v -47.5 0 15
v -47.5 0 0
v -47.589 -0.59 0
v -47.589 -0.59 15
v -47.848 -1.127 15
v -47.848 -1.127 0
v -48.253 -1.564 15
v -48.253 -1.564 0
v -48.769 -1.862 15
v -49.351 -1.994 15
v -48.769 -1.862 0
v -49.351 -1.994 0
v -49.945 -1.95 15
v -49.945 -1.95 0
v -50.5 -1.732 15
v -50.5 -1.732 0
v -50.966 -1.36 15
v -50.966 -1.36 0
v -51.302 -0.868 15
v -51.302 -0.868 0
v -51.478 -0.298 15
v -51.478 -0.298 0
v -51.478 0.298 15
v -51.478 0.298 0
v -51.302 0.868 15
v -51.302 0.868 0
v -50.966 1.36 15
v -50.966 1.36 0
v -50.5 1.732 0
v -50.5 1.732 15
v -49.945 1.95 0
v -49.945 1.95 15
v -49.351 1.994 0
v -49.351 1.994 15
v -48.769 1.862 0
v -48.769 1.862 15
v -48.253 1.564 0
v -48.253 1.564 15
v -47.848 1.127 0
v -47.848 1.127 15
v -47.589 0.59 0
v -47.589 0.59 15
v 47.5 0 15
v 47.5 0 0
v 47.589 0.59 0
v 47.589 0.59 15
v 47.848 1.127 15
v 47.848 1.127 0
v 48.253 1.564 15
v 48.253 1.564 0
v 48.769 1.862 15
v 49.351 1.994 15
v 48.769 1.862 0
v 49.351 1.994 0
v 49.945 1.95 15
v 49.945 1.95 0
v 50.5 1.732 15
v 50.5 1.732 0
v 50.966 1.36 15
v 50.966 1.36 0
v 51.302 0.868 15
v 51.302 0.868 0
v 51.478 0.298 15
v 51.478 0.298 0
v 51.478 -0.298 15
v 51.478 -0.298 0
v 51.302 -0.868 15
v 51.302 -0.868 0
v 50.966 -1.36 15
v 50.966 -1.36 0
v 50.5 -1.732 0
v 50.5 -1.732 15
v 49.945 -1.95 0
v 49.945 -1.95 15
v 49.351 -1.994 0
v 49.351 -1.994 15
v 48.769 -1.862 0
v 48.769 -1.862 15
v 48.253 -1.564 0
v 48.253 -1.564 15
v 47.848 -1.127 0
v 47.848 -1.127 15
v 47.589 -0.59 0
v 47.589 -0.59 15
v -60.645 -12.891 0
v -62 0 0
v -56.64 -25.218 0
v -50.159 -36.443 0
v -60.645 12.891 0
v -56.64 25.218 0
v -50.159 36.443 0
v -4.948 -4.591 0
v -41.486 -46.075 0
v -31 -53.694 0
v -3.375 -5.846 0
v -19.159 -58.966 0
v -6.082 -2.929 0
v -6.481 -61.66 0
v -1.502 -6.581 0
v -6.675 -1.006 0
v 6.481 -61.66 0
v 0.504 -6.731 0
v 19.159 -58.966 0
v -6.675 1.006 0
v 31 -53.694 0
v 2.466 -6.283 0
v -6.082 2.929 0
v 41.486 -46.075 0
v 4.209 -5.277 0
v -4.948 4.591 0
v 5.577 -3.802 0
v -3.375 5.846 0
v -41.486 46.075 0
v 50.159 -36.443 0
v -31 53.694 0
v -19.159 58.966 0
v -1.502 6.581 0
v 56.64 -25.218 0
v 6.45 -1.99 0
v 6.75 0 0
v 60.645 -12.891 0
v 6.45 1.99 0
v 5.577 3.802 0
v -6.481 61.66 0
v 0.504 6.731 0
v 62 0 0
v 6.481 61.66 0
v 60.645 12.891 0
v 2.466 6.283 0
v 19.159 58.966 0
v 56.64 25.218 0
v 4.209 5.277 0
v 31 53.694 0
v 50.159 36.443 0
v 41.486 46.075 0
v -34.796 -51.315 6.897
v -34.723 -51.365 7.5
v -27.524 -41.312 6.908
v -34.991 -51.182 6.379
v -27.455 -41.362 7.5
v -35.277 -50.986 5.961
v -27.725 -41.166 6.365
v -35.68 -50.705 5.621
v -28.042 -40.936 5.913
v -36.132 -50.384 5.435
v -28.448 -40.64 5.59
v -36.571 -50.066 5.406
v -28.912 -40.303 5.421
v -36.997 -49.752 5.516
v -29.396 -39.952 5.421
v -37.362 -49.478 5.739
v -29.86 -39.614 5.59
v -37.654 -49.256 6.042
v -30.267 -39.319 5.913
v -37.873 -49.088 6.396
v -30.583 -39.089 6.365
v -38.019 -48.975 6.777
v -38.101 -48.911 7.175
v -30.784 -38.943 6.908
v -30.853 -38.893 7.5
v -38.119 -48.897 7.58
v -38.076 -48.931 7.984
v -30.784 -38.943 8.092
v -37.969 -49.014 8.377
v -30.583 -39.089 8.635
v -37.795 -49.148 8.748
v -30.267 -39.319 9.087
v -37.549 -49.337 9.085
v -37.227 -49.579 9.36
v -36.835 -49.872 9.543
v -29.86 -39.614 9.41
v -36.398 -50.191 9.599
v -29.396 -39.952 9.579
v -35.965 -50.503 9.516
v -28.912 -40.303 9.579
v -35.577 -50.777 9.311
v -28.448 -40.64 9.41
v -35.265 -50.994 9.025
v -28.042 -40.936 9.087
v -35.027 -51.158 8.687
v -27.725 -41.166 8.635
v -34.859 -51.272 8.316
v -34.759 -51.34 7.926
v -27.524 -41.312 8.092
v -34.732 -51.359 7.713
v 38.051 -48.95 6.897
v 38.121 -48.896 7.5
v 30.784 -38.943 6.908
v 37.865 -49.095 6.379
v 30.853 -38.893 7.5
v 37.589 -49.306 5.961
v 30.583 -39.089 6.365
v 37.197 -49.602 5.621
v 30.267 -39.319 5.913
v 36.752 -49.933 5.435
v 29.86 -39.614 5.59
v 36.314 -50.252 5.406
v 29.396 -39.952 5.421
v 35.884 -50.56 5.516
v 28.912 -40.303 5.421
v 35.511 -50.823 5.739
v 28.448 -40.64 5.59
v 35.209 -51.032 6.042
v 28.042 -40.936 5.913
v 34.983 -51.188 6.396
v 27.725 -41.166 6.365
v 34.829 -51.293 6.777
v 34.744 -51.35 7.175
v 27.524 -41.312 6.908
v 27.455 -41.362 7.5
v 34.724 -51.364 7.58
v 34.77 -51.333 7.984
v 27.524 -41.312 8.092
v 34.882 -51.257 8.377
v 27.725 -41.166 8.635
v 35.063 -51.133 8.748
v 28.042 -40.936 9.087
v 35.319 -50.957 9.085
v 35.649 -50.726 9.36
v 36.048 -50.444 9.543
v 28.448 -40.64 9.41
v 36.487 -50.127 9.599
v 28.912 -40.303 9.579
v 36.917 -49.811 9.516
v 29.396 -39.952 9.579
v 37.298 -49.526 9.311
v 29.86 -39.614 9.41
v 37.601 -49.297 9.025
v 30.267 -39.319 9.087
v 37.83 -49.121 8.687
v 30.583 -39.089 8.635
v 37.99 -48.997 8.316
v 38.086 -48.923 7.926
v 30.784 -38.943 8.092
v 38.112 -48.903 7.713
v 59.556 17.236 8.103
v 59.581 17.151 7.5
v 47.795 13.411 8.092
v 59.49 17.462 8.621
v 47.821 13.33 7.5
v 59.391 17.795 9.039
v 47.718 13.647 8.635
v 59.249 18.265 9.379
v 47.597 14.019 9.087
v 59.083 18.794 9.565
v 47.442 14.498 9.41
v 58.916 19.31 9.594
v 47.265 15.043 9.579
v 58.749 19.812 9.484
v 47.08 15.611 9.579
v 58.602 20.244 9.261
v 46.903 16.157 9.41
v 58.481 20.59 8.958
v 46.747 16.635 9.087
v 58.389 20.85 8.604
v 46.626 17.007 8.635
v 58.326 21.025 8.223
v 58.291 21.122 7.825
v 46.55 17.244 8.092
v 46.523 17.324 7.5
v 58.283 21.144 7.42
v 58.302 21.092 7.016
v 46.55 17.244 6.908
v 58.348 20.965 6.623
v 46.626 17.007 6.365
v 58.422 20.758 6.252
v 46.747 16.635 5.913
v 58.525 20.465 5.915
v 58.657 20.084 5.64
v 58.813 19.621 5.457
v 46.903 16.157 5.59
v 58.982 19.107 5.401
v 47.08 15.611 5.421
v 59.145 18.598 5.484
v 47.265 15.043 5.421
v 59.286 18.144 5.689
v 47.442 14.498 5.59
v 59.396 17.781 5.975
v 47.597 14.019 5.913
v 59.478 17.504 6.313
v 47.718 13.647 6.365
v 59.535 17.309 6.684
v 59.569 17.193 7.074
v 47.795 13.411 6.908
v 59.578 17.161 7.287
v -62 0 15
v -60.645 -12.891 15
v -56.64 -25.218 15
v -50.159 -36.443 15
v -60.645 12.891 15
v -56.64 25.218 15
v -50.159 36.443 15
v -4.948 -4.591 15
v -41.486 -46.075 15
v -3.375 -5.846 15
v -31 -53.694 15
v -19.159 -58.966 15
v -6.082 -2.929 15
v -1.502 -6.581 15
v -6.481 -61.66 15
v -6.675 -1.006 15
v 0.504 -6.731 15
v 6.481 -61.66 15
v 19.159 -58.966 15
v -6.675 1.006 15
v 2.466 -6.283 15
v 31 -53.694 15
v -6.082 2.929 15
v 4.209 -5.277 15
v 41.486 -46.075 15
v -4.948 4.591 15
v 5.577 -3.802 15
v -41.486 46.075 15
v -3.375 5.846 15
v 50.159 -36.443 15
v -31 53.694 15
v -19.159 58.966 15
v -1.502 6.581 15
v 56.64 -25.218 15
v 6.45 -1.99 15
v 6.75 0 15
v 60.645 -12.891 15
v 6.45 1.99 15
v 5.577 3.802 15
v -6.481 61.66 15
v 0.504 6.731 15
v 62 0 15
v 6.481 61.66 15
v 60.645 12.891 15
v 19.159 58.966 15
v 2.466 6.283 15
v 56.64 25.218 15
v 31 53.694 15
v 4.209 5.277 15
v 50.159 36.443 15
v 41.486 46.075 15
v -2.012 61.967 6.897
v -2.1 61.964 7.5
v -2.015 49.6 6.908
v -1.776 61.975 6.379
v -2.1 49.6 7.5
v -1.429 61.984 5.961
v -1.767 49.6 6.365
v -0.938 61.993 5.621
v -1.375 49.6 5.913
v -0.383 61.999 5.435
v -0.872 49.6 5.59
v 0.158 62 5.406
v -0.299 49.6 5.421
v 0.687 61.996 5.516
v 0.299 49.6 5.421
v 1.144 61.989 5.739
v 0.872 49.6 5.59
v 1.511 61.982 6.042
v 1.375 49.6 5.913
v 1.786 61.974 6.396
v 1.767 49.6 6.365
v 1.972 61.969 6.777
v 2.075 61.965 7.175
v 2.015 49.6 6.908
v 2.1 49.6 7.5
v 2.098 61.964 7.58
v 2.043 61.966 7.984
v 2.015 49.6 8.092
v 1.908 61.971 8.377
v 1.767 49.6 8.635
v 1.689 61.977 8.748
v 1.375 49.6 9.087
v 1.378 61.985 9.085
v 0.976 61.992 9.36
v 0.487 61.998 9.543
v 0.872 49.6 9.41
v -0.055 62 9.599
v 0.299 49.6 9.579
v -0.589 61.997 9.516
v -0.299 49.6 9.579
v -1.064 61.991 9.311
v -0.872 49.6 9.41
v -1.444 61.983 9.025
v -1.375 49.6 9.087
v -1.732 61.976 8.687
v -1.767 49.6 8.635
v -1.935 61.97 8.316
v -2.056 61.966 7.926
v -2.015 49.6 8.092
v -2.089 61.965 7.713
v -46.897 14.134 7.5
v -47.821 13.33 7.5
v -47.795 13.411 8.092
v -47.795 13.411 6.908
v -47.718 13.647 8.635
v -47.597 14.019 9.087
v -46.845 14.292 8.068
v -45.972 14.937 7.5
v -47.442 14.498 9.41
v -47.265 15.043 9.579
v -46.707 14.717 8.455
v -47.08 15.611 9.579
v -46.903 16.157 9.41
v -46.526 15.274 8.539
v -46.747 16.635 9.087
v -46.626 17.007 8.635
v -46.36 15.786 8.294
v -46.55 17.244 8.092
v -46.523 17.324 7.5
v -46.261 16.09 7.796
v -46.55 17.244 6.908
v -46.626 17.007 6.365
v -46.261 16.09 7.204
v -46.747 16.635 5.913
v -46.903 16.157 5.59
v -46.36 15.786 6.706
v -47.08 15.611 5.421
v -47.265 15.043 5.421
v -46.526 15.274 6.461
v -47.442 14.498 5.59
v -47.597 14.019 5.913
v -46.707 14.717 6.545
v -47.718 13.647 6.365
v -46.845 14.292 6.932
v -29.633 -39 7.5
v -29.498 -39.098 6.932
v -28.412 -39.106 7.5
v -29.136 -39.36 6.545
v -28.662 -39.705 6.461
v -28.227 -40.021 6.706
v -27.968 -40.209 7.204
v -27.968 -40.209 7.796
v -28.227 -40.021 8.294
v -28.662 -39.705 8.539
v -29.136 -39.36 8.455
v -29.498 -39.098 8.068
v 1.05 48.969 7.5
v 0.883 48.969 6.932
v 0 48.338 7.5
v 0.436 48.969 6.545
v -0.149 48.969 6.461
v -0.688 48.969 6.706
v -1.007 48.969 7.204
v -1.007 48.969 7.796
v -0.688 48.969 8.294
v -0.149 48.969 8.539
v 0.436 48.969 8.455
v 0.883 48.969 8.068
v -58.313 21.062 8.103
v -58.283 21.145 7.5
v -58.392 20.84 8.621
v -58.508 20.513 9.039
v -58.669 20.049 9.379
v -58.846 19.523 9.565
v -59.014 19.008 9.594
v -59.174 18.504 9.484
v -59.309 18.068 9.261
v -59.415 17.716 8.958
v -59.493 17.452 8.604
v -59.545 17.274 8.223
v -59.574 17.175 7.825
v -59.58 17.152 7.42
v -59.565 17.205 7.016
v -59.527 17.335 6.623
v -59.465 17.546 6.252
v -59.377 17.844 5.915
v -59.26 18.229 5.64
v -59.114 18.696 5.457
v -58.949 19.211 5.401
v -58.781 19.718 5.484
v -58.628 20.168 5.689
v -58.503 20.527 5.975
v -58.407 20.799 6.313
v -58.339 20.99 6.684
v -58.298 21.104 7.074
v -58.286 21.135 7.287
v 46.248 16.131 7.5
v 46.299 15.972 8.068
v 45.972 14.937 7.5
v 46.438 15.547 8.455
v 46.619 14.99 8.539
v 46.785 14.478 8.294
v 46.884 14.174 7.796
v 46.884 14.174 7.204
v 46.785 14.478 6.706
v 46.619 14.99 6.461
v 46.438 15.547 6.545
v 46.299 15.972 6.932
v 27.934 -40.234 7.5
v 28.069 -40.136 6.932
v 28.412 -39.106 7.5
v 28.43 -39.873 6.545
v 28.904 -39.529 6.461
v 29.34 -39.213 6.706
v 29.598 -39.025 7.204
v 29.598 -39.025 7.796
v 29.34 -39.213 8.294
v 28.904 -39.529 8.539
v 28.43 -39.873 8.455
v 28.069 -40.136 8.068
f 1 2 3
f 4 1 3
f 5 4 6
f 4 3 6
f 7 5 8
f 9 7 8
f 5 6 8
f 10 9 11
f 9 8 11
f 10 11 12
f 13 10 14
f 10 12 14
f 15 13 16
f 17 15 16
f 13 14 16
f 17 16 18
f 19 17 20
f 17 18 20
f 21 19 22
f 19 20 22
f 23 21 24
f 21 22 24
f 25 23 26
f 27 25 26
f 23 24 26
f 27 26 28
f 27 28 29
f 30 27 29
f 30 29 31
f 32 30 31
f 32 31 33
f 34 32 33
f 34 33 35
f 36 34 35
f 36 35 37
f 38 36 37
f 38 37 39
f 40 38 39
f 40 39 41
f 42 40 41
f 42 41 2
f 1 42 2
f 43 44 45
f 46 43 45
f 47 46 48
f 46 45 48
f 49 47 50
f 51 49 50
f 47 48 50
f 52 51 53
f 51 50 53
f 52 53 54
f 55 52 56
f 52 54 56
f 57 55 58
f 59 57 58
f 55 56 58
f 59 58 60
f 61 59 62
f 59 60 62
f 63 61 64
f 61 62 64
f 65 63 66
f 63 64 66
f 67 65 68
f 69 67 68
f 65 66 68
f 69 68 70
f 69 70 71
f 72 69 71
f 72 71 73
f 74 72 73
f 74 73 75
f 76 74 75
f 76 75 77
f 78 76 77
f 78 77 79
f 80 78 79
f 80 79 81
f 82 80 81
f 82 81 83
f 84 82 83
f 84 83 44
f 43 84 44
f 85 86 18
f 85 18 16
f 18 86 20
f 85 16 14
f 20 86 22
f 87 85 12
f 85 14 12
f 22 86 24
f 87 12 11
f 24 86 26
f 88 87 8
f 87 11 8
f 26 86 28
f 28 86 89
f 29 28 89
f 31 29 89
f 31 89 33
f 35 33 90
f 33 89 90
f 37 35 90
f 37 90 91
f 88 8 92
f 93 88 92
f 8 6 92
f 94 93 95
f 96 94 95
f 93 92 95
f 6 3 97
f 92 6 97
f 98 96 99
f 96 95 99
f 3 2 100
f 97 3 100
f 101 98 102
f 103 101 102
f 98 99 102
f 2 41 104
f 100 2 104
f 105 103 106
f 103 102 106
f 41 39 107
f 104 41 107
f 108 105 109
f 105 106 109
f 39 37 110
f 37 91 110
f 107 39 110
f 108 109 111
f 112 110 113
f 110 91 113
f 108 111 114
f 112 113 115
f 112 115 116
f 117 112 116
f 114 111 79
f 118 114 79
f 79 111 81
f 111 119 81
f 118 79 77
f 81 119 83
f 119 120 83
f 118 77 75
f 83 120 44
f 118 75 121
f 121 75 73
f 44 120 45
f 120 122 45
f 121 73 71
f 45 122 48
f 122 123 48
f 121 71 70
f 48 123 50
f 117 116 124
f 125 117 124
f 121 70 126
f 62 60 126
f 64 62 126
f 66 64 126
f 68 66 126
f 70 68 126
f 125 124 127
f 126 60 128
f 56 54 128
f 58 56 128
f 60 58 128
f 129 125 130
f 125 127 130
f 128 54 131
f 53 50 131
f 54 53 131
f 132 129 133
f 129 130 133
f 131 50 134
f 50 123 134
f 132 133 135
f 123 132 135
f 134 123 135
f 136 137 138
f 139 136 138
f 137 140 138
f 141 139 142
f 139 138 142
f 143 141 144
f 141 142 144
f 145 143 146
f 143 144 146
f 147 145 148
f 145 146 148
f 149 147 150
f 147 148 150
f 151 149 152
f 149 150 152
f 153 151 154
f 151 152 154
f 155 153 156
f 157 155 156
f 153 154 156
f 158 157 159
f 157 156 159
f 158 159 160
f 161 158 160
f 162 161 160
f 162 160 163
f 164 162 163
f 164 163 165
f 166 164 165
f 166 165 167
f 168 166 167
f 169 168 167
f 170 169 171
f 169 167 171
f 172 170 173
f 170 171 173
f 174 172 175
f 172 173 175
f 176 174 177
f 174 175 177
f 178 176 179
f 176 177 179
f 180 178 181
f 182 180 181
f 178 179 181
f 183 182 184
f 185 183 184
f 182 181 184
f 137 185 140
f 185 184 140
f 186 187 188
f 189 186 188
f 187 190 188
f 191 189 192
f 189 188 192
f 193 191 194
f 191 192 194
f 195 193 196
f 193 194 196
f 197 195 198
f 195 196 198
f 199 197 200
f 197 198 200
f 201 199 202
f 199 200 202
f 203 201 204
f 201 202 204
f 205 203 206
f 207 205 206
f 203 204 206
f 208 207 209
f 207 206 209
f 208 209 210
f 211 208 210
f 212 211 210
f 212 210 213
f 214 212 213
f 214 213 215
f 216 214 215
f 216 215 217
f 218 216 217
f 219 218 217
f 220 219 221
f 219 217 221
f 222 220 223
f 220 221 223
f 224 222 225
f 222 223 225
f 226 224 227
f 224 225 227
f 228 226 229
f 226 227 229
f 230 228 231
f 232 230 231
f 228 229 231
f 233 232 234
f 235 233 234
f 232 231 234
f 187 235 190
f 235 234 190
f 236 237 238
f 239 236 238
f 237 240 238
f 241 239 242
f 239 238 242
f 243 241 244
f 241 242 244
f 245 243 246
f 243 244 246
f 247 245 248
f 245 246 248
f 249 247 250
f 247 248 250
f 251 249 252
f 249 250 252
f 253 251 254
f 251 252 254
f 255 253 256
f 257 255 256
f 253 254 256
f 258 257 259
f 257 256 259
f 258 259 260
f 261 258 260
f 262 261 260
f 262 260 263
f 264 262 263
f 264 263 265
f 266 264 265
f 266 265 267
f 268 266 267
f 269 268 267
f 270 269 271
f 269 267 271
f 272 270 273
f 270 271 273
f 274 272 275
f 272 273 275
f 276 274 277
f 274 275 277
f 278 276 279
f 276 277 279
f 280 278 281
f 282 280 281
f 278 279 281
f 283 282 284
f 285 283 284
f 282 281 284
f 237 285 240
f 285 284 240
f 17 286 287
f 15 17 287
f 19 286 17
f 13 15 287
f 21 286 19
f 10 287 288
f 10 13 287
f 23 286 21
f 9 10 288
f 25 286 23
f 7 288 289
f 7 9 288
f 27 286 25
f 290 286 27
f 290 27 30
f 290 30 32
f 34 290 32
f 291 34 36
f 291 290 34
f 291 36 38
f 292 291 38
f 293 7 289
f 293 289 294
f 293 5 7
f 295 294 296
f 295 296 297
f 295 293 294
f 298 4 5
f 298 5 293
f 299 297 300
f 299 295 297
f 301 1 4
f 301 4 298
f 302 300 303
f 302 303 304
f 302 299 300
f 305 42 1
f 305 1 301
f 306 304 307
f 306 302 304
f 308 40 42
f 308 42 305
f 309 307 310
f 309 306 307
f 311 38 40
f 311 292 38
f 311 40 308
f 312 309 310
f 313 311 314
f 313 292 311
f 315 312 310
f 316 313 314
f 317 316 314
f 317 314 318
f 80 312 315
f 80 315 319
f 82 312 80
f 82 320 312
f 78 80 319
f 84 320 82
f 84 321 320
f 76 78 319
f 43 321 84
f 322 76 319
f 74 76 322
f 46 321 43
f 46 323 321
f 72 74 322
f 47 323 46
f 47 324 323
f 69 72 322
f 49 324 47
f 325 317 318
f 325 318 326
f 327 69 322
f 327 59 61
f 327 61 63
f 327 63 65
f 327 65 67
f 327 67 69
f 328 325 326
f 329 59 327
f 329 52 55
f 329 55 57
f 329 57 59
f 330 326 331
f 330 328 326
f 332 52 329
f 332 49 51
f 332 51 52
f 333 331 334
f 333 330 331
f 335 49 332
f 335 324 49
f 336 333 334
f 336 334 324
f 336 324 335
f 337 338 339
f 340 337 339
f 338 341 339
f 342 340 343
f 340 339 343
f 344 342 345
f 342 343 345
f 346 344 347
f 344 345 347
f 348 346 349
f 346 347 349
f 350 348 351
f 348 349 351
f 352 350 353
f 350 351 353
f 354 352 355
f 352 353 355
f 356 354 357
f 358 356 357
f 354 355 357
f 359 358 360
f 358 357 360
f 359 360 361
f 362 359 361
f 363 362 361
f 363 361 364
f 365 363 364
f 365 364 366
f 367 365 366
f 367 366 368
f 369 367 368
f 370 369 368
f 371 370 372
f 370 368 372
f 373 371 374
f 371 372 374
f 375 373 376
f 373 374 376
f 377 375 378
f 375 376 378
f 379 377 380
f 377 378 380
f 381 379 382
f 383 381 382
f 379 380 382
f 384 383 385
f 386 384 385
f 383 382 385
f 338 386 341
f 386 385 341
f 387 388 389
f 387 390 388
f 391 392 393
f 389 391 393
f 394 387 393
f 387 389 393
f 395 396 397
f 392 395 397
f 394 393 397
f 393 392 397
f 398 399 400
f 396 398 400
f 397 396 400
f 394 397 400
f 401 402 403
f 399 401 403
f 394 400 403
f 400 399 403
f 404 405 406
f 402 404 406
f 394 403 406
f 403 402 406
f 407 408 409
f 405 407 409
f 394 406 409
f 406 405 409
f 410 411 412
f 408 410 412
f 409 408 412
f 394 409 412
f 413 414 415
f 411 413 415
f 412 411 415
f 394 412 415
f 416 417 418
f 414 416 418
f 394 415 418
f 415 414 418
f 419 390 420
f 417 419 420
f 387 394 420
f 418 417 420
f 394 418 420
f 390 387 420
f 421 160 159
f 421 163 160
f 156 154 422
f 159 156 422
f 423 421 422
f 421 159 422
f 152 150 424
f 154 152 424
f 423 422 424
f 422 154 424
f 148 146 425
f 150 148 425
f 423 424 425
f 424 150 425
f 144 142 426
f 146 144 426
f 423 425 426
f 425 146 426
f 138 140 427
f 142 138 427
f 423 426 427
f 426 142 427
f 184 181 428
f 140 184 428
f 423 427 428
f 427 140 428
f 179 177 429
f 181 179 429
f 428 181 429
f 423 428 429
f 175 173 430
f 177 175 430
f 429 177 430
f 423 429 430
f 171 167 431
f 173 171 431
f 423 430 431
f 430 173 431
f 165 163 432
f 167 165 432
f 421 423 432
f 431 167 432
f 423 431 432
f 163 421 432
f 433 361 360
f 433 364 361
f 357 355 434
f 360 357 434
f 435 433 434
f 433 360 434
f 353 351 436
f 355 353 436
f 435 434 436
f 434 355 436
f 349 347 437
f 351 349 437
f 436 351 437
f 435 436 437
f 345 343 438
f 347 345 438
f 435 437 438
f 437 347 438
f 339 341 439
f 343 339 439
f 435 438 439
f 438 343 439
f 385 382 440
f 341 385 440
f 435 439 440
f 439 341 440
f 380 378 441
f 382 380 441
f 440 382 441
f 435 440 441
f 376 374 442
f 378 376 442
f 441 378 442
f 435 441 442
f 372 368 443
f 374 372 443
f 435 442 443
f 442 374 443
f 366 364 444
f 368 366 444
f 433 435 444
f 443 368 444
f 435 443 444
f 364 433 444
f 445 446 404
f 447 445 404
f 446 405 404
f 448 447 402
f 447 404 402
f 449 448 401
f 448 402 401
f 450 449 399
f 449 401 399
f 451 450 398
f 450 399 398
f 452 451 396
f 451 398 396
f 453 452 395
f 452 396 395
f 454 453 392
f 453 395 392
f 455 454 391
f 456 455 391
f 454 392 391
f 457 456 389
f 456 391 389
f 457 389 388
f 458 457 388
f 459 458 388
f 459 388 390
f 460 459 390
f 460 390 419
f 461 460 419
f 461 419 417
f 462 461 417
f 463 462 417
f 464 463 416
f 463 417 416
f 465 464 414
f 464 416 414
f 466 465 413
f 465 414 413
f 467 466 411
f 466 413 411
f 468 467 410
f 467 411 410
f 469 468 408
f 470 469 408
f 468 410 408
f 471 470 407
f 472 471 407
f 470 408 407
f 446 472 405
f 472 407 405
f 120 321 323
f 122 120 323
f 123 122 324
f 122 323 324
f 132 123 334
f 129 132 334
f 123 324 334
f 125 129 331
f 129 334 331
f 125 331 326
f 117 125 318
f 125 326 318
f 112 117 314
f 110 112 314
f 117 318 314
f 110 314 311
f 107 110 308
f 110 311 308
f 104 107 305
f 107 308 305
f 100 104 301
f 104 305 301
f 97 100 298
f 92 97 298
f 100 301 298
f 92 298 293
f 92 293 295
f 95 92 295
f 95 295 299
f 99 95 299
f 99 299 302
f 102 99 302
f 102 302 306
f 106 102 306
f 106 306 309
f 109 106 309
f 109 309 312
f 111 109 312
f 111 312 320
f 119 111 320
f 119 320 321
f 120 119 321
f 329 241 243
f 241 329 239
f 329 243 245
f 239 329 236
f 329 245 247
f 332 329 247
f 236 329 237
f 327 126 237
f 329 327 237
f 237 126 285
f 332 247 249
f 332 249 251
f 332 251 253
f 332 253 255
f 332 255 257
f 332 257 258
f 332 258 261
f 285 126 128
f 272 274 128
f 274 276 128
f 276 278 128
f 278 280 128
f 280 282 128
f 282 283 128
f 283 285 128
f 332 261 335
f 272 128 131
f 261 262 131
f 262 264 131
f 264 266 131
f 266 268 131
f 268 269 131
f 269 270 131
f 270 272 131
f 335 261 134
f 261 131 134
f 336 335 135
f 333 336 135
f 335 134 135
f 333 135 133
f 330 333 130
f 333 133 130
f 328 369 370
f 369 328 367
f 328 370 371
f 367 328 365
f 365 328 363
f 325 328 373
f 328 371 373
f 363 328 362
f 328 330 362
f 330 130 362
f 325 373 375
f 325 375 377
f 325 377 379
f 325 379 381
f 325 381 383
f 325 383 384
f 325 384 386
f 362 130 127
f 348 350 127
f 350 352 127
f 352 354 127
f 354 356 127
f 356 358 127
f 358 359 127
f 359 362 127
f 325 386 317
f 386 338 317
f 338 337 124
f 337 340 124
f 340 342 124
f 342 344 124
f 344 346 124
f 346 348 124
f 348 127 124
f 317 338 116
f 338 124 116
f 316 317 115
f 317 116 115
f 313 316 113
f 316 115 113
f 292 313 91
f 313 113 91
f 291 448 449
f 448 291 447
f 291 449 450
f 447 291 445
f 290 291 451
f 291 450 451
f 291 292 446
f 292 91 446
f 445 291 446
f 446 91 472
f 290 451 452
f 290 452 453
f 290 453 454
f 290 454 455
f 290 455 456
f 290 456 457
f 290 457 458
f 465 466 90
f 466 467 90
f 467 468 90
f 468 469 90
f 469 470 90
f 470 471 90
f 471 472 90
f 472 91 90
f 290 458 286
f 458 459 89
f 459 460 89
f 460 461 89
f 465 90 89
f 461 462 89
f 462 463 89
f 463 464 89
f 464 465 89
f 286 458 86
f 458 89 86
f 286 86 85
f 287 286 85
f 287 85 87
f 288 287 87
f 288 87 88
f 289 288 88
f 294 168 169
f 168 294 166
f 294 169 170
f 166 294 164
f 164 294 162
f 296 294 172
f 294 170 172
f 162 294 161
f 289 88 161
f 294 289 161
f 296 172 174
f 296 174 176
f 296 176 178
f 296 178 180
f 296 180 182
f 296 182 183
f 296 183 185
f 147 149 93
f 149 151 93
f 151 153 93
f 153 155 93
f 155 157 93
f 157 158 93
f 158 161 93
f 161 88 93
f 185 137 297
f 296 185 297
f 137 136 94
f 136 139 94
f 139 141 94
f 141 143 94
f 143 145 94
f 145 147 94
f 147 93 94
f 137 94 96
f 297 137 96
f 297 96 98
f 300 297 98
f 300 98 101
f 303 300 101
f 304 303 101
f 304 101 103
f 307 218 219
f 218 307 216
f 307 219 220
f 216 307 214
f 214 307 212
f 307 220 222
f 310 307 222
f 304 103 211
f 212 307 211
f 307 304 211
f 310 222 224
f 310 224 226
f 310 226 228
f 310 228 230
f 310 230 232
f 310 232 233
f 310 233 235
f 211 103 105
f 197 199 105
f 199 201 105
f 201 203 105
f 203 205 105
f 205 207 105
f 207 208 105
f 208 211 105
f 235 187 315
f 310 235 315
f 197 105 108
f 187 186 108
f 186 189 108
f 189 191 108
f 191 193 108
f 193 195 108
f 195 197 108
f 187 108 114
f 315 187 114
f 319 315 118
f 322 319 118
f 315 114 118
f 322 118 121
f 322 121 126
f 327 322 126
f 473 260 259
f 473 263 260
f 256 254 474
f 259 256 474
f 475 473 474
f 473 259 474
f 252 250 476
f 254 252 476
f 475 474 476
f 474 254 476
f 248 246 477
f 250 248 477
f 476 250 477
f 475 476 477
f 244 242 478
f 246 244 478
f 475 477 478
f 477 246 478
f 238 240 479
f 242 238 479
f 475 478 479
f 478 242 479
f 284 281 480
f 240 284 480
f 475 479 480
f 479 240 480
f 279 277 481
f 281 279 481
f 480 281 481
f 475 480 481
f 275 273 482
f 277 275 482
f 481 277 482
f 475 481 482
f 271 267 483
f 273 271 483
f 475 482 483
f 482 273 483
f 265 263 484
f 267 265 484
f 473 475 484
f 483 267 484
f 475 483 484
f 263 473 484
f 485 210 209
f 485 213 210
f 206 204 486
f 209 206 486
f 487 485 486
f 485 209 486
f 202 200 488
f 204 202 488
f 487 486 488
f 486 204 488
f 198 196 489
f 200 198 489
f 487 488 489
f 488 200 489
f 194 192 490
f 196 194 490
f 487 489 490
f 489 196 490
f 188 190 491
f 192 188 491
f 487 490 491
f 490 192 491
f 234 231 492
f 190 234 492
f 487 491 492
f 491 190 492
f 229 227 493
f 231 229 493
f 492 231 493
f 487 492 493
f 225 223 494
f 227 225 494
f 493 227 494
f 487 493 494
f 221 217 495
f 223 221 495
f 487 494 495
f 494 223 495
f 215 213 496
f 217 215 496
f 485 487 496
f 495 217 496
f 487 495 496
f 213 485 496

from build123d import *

# Parameters (mm, degrees)
SKETCH1_R                       = 62
BOSS_EXTRUDE1_DEPTH             = 15
M12_CLEARANCE_HOLE1_D           = 13.5
M5_TAPPED_HOLE1_D               = 4.2
M5_TAPPED_HOLE1_DEPTH           = 12.4
M5_TAPPED_HOLE1_TIP             = 1.2618073
M5_TAPPED_HOLE1_ON_FACE_2_D     = 4.2
M5_TAPPED_HOLE1_ON_FACE_2_DEPTH = 12.4
M5_TAPPED_HOLE1_ON_FACE_2_TIP   = 1.2618073
M5_TAPPED_HOLE1_ON_FACE_3_D     = 4.2
M5_TAPPED_HOLE1_ON_FACE_3_DEPTH = 12.4
M5_TAPPED_HOLE1_ON_FACE_3_TIP   = 1.2618073
M5_TAPPED_HOLE1_ON_FACE_4_D     = 4.2
M5_TAPPED_HOLE1_ON_FACE_4_DEPTH = 12.4
M5_TAPPED_HOLE1_ON_FACE_4_TIP   = 1.2618073
M5_TAPPED_HOLE1_ON_FACE_5_D     = 4.2
M5_TAPPED_HOLE1_ON_FACE_5_DEPTH = 12.4
M5_TAPPED_HOLE1_ON_FACE_5_TIP   = 1.2618073
SKETCH12_R                      = 2
CUT_EXTRUDE1_DEPTH              = 32


with BuildPart() as part:
    # Sketch1 → Boss-Extrude1 (new body)
    with BuildSketch(Plane.XY):
        Circle(SKETCH1_R)
    extrude(amount=BOSS_EXTRUDE1_DEPTH)

    # M12 Clearance Hole1 (through all)
    with Locations(Plane(origin=(0, 0, 0), x_dir=(-1, 0, 0), z_dir=(0, 0, -1))):
        with Locations((0, 0)):
            Hole(M12_CLEARANCE_HOLE1_D / 2)

    # M5 Tapped Hole1
    with Locations(Plane(origin=(0, 62, 7.5), x_dir=(1, 0, 0), z_dir=(0, 1, 0))):
        with Locations((0, 0)):
            Hole(M5_TAPPED_HOLE1_D / 2, depth=M5_TAPPED_HOLE1_DEPTH)
            with Locations((0, 0, -(M5_TAPPED_HOLE1_DEPTH + M5_TAPPED_HOLE1_TIP / 2))):  # 118° drill point
                Cone(0, M5_TAPPED_HOLE1_D / 2, M5_TAPPED_HOLE1_TIP, mode=Mode.SUBTRACT)

    # M5 Tapped Hole1 on face 2
    with Locations(Plane(origin=(58.96550401, 19.159053651, 7.5), x_dir=(-0.309016857306, 0.951056560832, 0), z_dir=(0.951056560832, 0.309016857306, 0))):
        with Locations((0, 0)):
            Hole(M5_TAPPED_HOLE1_ON_FACE_2_D / 2, depth=M5_TAPPED_HOLE1_ON_FACE_2_DEPTH)
            with Locations((0, 0, -(M5_TAPPED_HOLE1_ON_FACE_2_DEPTH + M5_TAPPED_HOLE1_ON_FACE_2_TIP / 2))):  # 118° drill point
                Cone(0, M5_TAPPED_HOLE1_ON_FACE_2_D / 2, M5_TAPPED_HOLE1_ON_FACE_2_TIP, mode=Mode.SUBTRACT)

    # M5 Tapped Hole1 on face 3
    with Locations(Plane(origin=(36.442685642, -50.159053651, 7.5), x_dir=(-0.809017116291, -0.58778508449, 0), z_dir=(0.58778508449, -0.809017116291, 0))):
        with Locations((0, 0)):
            Hole(M5_TAPPED_HOLE1_ON_FACE_3_D / 2, depth=M5_TAPPED_HOLE1_ON_FACE_3_DEPTH)
            with Locations((0, 0, -(M5_TAPPED_HOLE1_ON_FACE_3_DEPTH + M5_TAPPED_HOLE1_ON_FACE_3_TIP / 2))):  # 118° drill point
                Cone(0, M5_TAPPED_HOLE1_ON_FACE_3_D / 2, M5_TAPPED_HOLE1_ON_FACE_3_TIP, mode=Mode.SUBTRACT)

    # M5 Tapped Hole1 on face 4
    with Locations(Plane(origin=(-36.442685642, -50.159053651, 7.5), x_dir=(-0.809017116291, 0.58778508449, 0), z_dir=(-0.58778508449, -0.809017116291, 0))):
        with Locations((0, 0)):
            Hole(M5_TAPPED_HOLE1_ON_FACE_4_D / 2, depth=M5_TAPPED_HOLE1_ON_FACE_4_DEPTH)
            with Locations((0, 0, -(M5_TAPPED_HOLE1_ON_FACE_4_DEPTH + M5_TAPPED_HOLE1_ON_FACE_4_TIP / 2))):  # 118° drill point
                Cone(0, M5_TAPPED_HOLE1_ON_FACE_4_D / 2, M5_TAPPED_HOLE1_ON_FACE_4_TIP, mode=Mode.SUBTRACT)

    # M5 Tapped Hole1 on face 5
    with Locations(Plane(origin=(-58.96550401, 19.159053651, 7.5), x_dir=(-0.309016857306, -0.951056560832, 0), z_dir=(-0.951056560832, 0.309016857306, 0))):
        with Locations((0, 0)):
            Hole(M5_TAPPED_HOLE1_ON_FACE_5_D / 2, depth=M5_TAPPED_HOLE1_ON_FACE_5_DEPTH)
            with Locations((0, 0, -(M5_TAPPED_HOLE1_ON_FACE_5_DEPTH + M5_TAPPED_HOLE1_ON_FACE_5_TIP / 2))):  # 118° drill point
                Cone(0, M5_TAPPED_HOLE1_ON_FACE_5_D / 2, M5_TAPPED_HOLE1_ON_FACE_5_TIP, mode=Mode.SUBTRACT)

    # Sketch12 → Cut-Extrude1 (cut)
    with BuildSketch(Plane(origin=(0, 0, 0), x_dir=(-1, 0, 0), z_dir=(0, 0, -1))):
        with Locations((-49.5, 0)):
            Circle(SKETCH12_R)
        with Locations(Location((49.5, 0, 0), (0, 0, 180))):
            Circle(SKETCH12_R)
    extrude(amount=-CUT_EXTRUDE1_DEPTH, mode=Mode.SUBTRACT)


solid = part.part
